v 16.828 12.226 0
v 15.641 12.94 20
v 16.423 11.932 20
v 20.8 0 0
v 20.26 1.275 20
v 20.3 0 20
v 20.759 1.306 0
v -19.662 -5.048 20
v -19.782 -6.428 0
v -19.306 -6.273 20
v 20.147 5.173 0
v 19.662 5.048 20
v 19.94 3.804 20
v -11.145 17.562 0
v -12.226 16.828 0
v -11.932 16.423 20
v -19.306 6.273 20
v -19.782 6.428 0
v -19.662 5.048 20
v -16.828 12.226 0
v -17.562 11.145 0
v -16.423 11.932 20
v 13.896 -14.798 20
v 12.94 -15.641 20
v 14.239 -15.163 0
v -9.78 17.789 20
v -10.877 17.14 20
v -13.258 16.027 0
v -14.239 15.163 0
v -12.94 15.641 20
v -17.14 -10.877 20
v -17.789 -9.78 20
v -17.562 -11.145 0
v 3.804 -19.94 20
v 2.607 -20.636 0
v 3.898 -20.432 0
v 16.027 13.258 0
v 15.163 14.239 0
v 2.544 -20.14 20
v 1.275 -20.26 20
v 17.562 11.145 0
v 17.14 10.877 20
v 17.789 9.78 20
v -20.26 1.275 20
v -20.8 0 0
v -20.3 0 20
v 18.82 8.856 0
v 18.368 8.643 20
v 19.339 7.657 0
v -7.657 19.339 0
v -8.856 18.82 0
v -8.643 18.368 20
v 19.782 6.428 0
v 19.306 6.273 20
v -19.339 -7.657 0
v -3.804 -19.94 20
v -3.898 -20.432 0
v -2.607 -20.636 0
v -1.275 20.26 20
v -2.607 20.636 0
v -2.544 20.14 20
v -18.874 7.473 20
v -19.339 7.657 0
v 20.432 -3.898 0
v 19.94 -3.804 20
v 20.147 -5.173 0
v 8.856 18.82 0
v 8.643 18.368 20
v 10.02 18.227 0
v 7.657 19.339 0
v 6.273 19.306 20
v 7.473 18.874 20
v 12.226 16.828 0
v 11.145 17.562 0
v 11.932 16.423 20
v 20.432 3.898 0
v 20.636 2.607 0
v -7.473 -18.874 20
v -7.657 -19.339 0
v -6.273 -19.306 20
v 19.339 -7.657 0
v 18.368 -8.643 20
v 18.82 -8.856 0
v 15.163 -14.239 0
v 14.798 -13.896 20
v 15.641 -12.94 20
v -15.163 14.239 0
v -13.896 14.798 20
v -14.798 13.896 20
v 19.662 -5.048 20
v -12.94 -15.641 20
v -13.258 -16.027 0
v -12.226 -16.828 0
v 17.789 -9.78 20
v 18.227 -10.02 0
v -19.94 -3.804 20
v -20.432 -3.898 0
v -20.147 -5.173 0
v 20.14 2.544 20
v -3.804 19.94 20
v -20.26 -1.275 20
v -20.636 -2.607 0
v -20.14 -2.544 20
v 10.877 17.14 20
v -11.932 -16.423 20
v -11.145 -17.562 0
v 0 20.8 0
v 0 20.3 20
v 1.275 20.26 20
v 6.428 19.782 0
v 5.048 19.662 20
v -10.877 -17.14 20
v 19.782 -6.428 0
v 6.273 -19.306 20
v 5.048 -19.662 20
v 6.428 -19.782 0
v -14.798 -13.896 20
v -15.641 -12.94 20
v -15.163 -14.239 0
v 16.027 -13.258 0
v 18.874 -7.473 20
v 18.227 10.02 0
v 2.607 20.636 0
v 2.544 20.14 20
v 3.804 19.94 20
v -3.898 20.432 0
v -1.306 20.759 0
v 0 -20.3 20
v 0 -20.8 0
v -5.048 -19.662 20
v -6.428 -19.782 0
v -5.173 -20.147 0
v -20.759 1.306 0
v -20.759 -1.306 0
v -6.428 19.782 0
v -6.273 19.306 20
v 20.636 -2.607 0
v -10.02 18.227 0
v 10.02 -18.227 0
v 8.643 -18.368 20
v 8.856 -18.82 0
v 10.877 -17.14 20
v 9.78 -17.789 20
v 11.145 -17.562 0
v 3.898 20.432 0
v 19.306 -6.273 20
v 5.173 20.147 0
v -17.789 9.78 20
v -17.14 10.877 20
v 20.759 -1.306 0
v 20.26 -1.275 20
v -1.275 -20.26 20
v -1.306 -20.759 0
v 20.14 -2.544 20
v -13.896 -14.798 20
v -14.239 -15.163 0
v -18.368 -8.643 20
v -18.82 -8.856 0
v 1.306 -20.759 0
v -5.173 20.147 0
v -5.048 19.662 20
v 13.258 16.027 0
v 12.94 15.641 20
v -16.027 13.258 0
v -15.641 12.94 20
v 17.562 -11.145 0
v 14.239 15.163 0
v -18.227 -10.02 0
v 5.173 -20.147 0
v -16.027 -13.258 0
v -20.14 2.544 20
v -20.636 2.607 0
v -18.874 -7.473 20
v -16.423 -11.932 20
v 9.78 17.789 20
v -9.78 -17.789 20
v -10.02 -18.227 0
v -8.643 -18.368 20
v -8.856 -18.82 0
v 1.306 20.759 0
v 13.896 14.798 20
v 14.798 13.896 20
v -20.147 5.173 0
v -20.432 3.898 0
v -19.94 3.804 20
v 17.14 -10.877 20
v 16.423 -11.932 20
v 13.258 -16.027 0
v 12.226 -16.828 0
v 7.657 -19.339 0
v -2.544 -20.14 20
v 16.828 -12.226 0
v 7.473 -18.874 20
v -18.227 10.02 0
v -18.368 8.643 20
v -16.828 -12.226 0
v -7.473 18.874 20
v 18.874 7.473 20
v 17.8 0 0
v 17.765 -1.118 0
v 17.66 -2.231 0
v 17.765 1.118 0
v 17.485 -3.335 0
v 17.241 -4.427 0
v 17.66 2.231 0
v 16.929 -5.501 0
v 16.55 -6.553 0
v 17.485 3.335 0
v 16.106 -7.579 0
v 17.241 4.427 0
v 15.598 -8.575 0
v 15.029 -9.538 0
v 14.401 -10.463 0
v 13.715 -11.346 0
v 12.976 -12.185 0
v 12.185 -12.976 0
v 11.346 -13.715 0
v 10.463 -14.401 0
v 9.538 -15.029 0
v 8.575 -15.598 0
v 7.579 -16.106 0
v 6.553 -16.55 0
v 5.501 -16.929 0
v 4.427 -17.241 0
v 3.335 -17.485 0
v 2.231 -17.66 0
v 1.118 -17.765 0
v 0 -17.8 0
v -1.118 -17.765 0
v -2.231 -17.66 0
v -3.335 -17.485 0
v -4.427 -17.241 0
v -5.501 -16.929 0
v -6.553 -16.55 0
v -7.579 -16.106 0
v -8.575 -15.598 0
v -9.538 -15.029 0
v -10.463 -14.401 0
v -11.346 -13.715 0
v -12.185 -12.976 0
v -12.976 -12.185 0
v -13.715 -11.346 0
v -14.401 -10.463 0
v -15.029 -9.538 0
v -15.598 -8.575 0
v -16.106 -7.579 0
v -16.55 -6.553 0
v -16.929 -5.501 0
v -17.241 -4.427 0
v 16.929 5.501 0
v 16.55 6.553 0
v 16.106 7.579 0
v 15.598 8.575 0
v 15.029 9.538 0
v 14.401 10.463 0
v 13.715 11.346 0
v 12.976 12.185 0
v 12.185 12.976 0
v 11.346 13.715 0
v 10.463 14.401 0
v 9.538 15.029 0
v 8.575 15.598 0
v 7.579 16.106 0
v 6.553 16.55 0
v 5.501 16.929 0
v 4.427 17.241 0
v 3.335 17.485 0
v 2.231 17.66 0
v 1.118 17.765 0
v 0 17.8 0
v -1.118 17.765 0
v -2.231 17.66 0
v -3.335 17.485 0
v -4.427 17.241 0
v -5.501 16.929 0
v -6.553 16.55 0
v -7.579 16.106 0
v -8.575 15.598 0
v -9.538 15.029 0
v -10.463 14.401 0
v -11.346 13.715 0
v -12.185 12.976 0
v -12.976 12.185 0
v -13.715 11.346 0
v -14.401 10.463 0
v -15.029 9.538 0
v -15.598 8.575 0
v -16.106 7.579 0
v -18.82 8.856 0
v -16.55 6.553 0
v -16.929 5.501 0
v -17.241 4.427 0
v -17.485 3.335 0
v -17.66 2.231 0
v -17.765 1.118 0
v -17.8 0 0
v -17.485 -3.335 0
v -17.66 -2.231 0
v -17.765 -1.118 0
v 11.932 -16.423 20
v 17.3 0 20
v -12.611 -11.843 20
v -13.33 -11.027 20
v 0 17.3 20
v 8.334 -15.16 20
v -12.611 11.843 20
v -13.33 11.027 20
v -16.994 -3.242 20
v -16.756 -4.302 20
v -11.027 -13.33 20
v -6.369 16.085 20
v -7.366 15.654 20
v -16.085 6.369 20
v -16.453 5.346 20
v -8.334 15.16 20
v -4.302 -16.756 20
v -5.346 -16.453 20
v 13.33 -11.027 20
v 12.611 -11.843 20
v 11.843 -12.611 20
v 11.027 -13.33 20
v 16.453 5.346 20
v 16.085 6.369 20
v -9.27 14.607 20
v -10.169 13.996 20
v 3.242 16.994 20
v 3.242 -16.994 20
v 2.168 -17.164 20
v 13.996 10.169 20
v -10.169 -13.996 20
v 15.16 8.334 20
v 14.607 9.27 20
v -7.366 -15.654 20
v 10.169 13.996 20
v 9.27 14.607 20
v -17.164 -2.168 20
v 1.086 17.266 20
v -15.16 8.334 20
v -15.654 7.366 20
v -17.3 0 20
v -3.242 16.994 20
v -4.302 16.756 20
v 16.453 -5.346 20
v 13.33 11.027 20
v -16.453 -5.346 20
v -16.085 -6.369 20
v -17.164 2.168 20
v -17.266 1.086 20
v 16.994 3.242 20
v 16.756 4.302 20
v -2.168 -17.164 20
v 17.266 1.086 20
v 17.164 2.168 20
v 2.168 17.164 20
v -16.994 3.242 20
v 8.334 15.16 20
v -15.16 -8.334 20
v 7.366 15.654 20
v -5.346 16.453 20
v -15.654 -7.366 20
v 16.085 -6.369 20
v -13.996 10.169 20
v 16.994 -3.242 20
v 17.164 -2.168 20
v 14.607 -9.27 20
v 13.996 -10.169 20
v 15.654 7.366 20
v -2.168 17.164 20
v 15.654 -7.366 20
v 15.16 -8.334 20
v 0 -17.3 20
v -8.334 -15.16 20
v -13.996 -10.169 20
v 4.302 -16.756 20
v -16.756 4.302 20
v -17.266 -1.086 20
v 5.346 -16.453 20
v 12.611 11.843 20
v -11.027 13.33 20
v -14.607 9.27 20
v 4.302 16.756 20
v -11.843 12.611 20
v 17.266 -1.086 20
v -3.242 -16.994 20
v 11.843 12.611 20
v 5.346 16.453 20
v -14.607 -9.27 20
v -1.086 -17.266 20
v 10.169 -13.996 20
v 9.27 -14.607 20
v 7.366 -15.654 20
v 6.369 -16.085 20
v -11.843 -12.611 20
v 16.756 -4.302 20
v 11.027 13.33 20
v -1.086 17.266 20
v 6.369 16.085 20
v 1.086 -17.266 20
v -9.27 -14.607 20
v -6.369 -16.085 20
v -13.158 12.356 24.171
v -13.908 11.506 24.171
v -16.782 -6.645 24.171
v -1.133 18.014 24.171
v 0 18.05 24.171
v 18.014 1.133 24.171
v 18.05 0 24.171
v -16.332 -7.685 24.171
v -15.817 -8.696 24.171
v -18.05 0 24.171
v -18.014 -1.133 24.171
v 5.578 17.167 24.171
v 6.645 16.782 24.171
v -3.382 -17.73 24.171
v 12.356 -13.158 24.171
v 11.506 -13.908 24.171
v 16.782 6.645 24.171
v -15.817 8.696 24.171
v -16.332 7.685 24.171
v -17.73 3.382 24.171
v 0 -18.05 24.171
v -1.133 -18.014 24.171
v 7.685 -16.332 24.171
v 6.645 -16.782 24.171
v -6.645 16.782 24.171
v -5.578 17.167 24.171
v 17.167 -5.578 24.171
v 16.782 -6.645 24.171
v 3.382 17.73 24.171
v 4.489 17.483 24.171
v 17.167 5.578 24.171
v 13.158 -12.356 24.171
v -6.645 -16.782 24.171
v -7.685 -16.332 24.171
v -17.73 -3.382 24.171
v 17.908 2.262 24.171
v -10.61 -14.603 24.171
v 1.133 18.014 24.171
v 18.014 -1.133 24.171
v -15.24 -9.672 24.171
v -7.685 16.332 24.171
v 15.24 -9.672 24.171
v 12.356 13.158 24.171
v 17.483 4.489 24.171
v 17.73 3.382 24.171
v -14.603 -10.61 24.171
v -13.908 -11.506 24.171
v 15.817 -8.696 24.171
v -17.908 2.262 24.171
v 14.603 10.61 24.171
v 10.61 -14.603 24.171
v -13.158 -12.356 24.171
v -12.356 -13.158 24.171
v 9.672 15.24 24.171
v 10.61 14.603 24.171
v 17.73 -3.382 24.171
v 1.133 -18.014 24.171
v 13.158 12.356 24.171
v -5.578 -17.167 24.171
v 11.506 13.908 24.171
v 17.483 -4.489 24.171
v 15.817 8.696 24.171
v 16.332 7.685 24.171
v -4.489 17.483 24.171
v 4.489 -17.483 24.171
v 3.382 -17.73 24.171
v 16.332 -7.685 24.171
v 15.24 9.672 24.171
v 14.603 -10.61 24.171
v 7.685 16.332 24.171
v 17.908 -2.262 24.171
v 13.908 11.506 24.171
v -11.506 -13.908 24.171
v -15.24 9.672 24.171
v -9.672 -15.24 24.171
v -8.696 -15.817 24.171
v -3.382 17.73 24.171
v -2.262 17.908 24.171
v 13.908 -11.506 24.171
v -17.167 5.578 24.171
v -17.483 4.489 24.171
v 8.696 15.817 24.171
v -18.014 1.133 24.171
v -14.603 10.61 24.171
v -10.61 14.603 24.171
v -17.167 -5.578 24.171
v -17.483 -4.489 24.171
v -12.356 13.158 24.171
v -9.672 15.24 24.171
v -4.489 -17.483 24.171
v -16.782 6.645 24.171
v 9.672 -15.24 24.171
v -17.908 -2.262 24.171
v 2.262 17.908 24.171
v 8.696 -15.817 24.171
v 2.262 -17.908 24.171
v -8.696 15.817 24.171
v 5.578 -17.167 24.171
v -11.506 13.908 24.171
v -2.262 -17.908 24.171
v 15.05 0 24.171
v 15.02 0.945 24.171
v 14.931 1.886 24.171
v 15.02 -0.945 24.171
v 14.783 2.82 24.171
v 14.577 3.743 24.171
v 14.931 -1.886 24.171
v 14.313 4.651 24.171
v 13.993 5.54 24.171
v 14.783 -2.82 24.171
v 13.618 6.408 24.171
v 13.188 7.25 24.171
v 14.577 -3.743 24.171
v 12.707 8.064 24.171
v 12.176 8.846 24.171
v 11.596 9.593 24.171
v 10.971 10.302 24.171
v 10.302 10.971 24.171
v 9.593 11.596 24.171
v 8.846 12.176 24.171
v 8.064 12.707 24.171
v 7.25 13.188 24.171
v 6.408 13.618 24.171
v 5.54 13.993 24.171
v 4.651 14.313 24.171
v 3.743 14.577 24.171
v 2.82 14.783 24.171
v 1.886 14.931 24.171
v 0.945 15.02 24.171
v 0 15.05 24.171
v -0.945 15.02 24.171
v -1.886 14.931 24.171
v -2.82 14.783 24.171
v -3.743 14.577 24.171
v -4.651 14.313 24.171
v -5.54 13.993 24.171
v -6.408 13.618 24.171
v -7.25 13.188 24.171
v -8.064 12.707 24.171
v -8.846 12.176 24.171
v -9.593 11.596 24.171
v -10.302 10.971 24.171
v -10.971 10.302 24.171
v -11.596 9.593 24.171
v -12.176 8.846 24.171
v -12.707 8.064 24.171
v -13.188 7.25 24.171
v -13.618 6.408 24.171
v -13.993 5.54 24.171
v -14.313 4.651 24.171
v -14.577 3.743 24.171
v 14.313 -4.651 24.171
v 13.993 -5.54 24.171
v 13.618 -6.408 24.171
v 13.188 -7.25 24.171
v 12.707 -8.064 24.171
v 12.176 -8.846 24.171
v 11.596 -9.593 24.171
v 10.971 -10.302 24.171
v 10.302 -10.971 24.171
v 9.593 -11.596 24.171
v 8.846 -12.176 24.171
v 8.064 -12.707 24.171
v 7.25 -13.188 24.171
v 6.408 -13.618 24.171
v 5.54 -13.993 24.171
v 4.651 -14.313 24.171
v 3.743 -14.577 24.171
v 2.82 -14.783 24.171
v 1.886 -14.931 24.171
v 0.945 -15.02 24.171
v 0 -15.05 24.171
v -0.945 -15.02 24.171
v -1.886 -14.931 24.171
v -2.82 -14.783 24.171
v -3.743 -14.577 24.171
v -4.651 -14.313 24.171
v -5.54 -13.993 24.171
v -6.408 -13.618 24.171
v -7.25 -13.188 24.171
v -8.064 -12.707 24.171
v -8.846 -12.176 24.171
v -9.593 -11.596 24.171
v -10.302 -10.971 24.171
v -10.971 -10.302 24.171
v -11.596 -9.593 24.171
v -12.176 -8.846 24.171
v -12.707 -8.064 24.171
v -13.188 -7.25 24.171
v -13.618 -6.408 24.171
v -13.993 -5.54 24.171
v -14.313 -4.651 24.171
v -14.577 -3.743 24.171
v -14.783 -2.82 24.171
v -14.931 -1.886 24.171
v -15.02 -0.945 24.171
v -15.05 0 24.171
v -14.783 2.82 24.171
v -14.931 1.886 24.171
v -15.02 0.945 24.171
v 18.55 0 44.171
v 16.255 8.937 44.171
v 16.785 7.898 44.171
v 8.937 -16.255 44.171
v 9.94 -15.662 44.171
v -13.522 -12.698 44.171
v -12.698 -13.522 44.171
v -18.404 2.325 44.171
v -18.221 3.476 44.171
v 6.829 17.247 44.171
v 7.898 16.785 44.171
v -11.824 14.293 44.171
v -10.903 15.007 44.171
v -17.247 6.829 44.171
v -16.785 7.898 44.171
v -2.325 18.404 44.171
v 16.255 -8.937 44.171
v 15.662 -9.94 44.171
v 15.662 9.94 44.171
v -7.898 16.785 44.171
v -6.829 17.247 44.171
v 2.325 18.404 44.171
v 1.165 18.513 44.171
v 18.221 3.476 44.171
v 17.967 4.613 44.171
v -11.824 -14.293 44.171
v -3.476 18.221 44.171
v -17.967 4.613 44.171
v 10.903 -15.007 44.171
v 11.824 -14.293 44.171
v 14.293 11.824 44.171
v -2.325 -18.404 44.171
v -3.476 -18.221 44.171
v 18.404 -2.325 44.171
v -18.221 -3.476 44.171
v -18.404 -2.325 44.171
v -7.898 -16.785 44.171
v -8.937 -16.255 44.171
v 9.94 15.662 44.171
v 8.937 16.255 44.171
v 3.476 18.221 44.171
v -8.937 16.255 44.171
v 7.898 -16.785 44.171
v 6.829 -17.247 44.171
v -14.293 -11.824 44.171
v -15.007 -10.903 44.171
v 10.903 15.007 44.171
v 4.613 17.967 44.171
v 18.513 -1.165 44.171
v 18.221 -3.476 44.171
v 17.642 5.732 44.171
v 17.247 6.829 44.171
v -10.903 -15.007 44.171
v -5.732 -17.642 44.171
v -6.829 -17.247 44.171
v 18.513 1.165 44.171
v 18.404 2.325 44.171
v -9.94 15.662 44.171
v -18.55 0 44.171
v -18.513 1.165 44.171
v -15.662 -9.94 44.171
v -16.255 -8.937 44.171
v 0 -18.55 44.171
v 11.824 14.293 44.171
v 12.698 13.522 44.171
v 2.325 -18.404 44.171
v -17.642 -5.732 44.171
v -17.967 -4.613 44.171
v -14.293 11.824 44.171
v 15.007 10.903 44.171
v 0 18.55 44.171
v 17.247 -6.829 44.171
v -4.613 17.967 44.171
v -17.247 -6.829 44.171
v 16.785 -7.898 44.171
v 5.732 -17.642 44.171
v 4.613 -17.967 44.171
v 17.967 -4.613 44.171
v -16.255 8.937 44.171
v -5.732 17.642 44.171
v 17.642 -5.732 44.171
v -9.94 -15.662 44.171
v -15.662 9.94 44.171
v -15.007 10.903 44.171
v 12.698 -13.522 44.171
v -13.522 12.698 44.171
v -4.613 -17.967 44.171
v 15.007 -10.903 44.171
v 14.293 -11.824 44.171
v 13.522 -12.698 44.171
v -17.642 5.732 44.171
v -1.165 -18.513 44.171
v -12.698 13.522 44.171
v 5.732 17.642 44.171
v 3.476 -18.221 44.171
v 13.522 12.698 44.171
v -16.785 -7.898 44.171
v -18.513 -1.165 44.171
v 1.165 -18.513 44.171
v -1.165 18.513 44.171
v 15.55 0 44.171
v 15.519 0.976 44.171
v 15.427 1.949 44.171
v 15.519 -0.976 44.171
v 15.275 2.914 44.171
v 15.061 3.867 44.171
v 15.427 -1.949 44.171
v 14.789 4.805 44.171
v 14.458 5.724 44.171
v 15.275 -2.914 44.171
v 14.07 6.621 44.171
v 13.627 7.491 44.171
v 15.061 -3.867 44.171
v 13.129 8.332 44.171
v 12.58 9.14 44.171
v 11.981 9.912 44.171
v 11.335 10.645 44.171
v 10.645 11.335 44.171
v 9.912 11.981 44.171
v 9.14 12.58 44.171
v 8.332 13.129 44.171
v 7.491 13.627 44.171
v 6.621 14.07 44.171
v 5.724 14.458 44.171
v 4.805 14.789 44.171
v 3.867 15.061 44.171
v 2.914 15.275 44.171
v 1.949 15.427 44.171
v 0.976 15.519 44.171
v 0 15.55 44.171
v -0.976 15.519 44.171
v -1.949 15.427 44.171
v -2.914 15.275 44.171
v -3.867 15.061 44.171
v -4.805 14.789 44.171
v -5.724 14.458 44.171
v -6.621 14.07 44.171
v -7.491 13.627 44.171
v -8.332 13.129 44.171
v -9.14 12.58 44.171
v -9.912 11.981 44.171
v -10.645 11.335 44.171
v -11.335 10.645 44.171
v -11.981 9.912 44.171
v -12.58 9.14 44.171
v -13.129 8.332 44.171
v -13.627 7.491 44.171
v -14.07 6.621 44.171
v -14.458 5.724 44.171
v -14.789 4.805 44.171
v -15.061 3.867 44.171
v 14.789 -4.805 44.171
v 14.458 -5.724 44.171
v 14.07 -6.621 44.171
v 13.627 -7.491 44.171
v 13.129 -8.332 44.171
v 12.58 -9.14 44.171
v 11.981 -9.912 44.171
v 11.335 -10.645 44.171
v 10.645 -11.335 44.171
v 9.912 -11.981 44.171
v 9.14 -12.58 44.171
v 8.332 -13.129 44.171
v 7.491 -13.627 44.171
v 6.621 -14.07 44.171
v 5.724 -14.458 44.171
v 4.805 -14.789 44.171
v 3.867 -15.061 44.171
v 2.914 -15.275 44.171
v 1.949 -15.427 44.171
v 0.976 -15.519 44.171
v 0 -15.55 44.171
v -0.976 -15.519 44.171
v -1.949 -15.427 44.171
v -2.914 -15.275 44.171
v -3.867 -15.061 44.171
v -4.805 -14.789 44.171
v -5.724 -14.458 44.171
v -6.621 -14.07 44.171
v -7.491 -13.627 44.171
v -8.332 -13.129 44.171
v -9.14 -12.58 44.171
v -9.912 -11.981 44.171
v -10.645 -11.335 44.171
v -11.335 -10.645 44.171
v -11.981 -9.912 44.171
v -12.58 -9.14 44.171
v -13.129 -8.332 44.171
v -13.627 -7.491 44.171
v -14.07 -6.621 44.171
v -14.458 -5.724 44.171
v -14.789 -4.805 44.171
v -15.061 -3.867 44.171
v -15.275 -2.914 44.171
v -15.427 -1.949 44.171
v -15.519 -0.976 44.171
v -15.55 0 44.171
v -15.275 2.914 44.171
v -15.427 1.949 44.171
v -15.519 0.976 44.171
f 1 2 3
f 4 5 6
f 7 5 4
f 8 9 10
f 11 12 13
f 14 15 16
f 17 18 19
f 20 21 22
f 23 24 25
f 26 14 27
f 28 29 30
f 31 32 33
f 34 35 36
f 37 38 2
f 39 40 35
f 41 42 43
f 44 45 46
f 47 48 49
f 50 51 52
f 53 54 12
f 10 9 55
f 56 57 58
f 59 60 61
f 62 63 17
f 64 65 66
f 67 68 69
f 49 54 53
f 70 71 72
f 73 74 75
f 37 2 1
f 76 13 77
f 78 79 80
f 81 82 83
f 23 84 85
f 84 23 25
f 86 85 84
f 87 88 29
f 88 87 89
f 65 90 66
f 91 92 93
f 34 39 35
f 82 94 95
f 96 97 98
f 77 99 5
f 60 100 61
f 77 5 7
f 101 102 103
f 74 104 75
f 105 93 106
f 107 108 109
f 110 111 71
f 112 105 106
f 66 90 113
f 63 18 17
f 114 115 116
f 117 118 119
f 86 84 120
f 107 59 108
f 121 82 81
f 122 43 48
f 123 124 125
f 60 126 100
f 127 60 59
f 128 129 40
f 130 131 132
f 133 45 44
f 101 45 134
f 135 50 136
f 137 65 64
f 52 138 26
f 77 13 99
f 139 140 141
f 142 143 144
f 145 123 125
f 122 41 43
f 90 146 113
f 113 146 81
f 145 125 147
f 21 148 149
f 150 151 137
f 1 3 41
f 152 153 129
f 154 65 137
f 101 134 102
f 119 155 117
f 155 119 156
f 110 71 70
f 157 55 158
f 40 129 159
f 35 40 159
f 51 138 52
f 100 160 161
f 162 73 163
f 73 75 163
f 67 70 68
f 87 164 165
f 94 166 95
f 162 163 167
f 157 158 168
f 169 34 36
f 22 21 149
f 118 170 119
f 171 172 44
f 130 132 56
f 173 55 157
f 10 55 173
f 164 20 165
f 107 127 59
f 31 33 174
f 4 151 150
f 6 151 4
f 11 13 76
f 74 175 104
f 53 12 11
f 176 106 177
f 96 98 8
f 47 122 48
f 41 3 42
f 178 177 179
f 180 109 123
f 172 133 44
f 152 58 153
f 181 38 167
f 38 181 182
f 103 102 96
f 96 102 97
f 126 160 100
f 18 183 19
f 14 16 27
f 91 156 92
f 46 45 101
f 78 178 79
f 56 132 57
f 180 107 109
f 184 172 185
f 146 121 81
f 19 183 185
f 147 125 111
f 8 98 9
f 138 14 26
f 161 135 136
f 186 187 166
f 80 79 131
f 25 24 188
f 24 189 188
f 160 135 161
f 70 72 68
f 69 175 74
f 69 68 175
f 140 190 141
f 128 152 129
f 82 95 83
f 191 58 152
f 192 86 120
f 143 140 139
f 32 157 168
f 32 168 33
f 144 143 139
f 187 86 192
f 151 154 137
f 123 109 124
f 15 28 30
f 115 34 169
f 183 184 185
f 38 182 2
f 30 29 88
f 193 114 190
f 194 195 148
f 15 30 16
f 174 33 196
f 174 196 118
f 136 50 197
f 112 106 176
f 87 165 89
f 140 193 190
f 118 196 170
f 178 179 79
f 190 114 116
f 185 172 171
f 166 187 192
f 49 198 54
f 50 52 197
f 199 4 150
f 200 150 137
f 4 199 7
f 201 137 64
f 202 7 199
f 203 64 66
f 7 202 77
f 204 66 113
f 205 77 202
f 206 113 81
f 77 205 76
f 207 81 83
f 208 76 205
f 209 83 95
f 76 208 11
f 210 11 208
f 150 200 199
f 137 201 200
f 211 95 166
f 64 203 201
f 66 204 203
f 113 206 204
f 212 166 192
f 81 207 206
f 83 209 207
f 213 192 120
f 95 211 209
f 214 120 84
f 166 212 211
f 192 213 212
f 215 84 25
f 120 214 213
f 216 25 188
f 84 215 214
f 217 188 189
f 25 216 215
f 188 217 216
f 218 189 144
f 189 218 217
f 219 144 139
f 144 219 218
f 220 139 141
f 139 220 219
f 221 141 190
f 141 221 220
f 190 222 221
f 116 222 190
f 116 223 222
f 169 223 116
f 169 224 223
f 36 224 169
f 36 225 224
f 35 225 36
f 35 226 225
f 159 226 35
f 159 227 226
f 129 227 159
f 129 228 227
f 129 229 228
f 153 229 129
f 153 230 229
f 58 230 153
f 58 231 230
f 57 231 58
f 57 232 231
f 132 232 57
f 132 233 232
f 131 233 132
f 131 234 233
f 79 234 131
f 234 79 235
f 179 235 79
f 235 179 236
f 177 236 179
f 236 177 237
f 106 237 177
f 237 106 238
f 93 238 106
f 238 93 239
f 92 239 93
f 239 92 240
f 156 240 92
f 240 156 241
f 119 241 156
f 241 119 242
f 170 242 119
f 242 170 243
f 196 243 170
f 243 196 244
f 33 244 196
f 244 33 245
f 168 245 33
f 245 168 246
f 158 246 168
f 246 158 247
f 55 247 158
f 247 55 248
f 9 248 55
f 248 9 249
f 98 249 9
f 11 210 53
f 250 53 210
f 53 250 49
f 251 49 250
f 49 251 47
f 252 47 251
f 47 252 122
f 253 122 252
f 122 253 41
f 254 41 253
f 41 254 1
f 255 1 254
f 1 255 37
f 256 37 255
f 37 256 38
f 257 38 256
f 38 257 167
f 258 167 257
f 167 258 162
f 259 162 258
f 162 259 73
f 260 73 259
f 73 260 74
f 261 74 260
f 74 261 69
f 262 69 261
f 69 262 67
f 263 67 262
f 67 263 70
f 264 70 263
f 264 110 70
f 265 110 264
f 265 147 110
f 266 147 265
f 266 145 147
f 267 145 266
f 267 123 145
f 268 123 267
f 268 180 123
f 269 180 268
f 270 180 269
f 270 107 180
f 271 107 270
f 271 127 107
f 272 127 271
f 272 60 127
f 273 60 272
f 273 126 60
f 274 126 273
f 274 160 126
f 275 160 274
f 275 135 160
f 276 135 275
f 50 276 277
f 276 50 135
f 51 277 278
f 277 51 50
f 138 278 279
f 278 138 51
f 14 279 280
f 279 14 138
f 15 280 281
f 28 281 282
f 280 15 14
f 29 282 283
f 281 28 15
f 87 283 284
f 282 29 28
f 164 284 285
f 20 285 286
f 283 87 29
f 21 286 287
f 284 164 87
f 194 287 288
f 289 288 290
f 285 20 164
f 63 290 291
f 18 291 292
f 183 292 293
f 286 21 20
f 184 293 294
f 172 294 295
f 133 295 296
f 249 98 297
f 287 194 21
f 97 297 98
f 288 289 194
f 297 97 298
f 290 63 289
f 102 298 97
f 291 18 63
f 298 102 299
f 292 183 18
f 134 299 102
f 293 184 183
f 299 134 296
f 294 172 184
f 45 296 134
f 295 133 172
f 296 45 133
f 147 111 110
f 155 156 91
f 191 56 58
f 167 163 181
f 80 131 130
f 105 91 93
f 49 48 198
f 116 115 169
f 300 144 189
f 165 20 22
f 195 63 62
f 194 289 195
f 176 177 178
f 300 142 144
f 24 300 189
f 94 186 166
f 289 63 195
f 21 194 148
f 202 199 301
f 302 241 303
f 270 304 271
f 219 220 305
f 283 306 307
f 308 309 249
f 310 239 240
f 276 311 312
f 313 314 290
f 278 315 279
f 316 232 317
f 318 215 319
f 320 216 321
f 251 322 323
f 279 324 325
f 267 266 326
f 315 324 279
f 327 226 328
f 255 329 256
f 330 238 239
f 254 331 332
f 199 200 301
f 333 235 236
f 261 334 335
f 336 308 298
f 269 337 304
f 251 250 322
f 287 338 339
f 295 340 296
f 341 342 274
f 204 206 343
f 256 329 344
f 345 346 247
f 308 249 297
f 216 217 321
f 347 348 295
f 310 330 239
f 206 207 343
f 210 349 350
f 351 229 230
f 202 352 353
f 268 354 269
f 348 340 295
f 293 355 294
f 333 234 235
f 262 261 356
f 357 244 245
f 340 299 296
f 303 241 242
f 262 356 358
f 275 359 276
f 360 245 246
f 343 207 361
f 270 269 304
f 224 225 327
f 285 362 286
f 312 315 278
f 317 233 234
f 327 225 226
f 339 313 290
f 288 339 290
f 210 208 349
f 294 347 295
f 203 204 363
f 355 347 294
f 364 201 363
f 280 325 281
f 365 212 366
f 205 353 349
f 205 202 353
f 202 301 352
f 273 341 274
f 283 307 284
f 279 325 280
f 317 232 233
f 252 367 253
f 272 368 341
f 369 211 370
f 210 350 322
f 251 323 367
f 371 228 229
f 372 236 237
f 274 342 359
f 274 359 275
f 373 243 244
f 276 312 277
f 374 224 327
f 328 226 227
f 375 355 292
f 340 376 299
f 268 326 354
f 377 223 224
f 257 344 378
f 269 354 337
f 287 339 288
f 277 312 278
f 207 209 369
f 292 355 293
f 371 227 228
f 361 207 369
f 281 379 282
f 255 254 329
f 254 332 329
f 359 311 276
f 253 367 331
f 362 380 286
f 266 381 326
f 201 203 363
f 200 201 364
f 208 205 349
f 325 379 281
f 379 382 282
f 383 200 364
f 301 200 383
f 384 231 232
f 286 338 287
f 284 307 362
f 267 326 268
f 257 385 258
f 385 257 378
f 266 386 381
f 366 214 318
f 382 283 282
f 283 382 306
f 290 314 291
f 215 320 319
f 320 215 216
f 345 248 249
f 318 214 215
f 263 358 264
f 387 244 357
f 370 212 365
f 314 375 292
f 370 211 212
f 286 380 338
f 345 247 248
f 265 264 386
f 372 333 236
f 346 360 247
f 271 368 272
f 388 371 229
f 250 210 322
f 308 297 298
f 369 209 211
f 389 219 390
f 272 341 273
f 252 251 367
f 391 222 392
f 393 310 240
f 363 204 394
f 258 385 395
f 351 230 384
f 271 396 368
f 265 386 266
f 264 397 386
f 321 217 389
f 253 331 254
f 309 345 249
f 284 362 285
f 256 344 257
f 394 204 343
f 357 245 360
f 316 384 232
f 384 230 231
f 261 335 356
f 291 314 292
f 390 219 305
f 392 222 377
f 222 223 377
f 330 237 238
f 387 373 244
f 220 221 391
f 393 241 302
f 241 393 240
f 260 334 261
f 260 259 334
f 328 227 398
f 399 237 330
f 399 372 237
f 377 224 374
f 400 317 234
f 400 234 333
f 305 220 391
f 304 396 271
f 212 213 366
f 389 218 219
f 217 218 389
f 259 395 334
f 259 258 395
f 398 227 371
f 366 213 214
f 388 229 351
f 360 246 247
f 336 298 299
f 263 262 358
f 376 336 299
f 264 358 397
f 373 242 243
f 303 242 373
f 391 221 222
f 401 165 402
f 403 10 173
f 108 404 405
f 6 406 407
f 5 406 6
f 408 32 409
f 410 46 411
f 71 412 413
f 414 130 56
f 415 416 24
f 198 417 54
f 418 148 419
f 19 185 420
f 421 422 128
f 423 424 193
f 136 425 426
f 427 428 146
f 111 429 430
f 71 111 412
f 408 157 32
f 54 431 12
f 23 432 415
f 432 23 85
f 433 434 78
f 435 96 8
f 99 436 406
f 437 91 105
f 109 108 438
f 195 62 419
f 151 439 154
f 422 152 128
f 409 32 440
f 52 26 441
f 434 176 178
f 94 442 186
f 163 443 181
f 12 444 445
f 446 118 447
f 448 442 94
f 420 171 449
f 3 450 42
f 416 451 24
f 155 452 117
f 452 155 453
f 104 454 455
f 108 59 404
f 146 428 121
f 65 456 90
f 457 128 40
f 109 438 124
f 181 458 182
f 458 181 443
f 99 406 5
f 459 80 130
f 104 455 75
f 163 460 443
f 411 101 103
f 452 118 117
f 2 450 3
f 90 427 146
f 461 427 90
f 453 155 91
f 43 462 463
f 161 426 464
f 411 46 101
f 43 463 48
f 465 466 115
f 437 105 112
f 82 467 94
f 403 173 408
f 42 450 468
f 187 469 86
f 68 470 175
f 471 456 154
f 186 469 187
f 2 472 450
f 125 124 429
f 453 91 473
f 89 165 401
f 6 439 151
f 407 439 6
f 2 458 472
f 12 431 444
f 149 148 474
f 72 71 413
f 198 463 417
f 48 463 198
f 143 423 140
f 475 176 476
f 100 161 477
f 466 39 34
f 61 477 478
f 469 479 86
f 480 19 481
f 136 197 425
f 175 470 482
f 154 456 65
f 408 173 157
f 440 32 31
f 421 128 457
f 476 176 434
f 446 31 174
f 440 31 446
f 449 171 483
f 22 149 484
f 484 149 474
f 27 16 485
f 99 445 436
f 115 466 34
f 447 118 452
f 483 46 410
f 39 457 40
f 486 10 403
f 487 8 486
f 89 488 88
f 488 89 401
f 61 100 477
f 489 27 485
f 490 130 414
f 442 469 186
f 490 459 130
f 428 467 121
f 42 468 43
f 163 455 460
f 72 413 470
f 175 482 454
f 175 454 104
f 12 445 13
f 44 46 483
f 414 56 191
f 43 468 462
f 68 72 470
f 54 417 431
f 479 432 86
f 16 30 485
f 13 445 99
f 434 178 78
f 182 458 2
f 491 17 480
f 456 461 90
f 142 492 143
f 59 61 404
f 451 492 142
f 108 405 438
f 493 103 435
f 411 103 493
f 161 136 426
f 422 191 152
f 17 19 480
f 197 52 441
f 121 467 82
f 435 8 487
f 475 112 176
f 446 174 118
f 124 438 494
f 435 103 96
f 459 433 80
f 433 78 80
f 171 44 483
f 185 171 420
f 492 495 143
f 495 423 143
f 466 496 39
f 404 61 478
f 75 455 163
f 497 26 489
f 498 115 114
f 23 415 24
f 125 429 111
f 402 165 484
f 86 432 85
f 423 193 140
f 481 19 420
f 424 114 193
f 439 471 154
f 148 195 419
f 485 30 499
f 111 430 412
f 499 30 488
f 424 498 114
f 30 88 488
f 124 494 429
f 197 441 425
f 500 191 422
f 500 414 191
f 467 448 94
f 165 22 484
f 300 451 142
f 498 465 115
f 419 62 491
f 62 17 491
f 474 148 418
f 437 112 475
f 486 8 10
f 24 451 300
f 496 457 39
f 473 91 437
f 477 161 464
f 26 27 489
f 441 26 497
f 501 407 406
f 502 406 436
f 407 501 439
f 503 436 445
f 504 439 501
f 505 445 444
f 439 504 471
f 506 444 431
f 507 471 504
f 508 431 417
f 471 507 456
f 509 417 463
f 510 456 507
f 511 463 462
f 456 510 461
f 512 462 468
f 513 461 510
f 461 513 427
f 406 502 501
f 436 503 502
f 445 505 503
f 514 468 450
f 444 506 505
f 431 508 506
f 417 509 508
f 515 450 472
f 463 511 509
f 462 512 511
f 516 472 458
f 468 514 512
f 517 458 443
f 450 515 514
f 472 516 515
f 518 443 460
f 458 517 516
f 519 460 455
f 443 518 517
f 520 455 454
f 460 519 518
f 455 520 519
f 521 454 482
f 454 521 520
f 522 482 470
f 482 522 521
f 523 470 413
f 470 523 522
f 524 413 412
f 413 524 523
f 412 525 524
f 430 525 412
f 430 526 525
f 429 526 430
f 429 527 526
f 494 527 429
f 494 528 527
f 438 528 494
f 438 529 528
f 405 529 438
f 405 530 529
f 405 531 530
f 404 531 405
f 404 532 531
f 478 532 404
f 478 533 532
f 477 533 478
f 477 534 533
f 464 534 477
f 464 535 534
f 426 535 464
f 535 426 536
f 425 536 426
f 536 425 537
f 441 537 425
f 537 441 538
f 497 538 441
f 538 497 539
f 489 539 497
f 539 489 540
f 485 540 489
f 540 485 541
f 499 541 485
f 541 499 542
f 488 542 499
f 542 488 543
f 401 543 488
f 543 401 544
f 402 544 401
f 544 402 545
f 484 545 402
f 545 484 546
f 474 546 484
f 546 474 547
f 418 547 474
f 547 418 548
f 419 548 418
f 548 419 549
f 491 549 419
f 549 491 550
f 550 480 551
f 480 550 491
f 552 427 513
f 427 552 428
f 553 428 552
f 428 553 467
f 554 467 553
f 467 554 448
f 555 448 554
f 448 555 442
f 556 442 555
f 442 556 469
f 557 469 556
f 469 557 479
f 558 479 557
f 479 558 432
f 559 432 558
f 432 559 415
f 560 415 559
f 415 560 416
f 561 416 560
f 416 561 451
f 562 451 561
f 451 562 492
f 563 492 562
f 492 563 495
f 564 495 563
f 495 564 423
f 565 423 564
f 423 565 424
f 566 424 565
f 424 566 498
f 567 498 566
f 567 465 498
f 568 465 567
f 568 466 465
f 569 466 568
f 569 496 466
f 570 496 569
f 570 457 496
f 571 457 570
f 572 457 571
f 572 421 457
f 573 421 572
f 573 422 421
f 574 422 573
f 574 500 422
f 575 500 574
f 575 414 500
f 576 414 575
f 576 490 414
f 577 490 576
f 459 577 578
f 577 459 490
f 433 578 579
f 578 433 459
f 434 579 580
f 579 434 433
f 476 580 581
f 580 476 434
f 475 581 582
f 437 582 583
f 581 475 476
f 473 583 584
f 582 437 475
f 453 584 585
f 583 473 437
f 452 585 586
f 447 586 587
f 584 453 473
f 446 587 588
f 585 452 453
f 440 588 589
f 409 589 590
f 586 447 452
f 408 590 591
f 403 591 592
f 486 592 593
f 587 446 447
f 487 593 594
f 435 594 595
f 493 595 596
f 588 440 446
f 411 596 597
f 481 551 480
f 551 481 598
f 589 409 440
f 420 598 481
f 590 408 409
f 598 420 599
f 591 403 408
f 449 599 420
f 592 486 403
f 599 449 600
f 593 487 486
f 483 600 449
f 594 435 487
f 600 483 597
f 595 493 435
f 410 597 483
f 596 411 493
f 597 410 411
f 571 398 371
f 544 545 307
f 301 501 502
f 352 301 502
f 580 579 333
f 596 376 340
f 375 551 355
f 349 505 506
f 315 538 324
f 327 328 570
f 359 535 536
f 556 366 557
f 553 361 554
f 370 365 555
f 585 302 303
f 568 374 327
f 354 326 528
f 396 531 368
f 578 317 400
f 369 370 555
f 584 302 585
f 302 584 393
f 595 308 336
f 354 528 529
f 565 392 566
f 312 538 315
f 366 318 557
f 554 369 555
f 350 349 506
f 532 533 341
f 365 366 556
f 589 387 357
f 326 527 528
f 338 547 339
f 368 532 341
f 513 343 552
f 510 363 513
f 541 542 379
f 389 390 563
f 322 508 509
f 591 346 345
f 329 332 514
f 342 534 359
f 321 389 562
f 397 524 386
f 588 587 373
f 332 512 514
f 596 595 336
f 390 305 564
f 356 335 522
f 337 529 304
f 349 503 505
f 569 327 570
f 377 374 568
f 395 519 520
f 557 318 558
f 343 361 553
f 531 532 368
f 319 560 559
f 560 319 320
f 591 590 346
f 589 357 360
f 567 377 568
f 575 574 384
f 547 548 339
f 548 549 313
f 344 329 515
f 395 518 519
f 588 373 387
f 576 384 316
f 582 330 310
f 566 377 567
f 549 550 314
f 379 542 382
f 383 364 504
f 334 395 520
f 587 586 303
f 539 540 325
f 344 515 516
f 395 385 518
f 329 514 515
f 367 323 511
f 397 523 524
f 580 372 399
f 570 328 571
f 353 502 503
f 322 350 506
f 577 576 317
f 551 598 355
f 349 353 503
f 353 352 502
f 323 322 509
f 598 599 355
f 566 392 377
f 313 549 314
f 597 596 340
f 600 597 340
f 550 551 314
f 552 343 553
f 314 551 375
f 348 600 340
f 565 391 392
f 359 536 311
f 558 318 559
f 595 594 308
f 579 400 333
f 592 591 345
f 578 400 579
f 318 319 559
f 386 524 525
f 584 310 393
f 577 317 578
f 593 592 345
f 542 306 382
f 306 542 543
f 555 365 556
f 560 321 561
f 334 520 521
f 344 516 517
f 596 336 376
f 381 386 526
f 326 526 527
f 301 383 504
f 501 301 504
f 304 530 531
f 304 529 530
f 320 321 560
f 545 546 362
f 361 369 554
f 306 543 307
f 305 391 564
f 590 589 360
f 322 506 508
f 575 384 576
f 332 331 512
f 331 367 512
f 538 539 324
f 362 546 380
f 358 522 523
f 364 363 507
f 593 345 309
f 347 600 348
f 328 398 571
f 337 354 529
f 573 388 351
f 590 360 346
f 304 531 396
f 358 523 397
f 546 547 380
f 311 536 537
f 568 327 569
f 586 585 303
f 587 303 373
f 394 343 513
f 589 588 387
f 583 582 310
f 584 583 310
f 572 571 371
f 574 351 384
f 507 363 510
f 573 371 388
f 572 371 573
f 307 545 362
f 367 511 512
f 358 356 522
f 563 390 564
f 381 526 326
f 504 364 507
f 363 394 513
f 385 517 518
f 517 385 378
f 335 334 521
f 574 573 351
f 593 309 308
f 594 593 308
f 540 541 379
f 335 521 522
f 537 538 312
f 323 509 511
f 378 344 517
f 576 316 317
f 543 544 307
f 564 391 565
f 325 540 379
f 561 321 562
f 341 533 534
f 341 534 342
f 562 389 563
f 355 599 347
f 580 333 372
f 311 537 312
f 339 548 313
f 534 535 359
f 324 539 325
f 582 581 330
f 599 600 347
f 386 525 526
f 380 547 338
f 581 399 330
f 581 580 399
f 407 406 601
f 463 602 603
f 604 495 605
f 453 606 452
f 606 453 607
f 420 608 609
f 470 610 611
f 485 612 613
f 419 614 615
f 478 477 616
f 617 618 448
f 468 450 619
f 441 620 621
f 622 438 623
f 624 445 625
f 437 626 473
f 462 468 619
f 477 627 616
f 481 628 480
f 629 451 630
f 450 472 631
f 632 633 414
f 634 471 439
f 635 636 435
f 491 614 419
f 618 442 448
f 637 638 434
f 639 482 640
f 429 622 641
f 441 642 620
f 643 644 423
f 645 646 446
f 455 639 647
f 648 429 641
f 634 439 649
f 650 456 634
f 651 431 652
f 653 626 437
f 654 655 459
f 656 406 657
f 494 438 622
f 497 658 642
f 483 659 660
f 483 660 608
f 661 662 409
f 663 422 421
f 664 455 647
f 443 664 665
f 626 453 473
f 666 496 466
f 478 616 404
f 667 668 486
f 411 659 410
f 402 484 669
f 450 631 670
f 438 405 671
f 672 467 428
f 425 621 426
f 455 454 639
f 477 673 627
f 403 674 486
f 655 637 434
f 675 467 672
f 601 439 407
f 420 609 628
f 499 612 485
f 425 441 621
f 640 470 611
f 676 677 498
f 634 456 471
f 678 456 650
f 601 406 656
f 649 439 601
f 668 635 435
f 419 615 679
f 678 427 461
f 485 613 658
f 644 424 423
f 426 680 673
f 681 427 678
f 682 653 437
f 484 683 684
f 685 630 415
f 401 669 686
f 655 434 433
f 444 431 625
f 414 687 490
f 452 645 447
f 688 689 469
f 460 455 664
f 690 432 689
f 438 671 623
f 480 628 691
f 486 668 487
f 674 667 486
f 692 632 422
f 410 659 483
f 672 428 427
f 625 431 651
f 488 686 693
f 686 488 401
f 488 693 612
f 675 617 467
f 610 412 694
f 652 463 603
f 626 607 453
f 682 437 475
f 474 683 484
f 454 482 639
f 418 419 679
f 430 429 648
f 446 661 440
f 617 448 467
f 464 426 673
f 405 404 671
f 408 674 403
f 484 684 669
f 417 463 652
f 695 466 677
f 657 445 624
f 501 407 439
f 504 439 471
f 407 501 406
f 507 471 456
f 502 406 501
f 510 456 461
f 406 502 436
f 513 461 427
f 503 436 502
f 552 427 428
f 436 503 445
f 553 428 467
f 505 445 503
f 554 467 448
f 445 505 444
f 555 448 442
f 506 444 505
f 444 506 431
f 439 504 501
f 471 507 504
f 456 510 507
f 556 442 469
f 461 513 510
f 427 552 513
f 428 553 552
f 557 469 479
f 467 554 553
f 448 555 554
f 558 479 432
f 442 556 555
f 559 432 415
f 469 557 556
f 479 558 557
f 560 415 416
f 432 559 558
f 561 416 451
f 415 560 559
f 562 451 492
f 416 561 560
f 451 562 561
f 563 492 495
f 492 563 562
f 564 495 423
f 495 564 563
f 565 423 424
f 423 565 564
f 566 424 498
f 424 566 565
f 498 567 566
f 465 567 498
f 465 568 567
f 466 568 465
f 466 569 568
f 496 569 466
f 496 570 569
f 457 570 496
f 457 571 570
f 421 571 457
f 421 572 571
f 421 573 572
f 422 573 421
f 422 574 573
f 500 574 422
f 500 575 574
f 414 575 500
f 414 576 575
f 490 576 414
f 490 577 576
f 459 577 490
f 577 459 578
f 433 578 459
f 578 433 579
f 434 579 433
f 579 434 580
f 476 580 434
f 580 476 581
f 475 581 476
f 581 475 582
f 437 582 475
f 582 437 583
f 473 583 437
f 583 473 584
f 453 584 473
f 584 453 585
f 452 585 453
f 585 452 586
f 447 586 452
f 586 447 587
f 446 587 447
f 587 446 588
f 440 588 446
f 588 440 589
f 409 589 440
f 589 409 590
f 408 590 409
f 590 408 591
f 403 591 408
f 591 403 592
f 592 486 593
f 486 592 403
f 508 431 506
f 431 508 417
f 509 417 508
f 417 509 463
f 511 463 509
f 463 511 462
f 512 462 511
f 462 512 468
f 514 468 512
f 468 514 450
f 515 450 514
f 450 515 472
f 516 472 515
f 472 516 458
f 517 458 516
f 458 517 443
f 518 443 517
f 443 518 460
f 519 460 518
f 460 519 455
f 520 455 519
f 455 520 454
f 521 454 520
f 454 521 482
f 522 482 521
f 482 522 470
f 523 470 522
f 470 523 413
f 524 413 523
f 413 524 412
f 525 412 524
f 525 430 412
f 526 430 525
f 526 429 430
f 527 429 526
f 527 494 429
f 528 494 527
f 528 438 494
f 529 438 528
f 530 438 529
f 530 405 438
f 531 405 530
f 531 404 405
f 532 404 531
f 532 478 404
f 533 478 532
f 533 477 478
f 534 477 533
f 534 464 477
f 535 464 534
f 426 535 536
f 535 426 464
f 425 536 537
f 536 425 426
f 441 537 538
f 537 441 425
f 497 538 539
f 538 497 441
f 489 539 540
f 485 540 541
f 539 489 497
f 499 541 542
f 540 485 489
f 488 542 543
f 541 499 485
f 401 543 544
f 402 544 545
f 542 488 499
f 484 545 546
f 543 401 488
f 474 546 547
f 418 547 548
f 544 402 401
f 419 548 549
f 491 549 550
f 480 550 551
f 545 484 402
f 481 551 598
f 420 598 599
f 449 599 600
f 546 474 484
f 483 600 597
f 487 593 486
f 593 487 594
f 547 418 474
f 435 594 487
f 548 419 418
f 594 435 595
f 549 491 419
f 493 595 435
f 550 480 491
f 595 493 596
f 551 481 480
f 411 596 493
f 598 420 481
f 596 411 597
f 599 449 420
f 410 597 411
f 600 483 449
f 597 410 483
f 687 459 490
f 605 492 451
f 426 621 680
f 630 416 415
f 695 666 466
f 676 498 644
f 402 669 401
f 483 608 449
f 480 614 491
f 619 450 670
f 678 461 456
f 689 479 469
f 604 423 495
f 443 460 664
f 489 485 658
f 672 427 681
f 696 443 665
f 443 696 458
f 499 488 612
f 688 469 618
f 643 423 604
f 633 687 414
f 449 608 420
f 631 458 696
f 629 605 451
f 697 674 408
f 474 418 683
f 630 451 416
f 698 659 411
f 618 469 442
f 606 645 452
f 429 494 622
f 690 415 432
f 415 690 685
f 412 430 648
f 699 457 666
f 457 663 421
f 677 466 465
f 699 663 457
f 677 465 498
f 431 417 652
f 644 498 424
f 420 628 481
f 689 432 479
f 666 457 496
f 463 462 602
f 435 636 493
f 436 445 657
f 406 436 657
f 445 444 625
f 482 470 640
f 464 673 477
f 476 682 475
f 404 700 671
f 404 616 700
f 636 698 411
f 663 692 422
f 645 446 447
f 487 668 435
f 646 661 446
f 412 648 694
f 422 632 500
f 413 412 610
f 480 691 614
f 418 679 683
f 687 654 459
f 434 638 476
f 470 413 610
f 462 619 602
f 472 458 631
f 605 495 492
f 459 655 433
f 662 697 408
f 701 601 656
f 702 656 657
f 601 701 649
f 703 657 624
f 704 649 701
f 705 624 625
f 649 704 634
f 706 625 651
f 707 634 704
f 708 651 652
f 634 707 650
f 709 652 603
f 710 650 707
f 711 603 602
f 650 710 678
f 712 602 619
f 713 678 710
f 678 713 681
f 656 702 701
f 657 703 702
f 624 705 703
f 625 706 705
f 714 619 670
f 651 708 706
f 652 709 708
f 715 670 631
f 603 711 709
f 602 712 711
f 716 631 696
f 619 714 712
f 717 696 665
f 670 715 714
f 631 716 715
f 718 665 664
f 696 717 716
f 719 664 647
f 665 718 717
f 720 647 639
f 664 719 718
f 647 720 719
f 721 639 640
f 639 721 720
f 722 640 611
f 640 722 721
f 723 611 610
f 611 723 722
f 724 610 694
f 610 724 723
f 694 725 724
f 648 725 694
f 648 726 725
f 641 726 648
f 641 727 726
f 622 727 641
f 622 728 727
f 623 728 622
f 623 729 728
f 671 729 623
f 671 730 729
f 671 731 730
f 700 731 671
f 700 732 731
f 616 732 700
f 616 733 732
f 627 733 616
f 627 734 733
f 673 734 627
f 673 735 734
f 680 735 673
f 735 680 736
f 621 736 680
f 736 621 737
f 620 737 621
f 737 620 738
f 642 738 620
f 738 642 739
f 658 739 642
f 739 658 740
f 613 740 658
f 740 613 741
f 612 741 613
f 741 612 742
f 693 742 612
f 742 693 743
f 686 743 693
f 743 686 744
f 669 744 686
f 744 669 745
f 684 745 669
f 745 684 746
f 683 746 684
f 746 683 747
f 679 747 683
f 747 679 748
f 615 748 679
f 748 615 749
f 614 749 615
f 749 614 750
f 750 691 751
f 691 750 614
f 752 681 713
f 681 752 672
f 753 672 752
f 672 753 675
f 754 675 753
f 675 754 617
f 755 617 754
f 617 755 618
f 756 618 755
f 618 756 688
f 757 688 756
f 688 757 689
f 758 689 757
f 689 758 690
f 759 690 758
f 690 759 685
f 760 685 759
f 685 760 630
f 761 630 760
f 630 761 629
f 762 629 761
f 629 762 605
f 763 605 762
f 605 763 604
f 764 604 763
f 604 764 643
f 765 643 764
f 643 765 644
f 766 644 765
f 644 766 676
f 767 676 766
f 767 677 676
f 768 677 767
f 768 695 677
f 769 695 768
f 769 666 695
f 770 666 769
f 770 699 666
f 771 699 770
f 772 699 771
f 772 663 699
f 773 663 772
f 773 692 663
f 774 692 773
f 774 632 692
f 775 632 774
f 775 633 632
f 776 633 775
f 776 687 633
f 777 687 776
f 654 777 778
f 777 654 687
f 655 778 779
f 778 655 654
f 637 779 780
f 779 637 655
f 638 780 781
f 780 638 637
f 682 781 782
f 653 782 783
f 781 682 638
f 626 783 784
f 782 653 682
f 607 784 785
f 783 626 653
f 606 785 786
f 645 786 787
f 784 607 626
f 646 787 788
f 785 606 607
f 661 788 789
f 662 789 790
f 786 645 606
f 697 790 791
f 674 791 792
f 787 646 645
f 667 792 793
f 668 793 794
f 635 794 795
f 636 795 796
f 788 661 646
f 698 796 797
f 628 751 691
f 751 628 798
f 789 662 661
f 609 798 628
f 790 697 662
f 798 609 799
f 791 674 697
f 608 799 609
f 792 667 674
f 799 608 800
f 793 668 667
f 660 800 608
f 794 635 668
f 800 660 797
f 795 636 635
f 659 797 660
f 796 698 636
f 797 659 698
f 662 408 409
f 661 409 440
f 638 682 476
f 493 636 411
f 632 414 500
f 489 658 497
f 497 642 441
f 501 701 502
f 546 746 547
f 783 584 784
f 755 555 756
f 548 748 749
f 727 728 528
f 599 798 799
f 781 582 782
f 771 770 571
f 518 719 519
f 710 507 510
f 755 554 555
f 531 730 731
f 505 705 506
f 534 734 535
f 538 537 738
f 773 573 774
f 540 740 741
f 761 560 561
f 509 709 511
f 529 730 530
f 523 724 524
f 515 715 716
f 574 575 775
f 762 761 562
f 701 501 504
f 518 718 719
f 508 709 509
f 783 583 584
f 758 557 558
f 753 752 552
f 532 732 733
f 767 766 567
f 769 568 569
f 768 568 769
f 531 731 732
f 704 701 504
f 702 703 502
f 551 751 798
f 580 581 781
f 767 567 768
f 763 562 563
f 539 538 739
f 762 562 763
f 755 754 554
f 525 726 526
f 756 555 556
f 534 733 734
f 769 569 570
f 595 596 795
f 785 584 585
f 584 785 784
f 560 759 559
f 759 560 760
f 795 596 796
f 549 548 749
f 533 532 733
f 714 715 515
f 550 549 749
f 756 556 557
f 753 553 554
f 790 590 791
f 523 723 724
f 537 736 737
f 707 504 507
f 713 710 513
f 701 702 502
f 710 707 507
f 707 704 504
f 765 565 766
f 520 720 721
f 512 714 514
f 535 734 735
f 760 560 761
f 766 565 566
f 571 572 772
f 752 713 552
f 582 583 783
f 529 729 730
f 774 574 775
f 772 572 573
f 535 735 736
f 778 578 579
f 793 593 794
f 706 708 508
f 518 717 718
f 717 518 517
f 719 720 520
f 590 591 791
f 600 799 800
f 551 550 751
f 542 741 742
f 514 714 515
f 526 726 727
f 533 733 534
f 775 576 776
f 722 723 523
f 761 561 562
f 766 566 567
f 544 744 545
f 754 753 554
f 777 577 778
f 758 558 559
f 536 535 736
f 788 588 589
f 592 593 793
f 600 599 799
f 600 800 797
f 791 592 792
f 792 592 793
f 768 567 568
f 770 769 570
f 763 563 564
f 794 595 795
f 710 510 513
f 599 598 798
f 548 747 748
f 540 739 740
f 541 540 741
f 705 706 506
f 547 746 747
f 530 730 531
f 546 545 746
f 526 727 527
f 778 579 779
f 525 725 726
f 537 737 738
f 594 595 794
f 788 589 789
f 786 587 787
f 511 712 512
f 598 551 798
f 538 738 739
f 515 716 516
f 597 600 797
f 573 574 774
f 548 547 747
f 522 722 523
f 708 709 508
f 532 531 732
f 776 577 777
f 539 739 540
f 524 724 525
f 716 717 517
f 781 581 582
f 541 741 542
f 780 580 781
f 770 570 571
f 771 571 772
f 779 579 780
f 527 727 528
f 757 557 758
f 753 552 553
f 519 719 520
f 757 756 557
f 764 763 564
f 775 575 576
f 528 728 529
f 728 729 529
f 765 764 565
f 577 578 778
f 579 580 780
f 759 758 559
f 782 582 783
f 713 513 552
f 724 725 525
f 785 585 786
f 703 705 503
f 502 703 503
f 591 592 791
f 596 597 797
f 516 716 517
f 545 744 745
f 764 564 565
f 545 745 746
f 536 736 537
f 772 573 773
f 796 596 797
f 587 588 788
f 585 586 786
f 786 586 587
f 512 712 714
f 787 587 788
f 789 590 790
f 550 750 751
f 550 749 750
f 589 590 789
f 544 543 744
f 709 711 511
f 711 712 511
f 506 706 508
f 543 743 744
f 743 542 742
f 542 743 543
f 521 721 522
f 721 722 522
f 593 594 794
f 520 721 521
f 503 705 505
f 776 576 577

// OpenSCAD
/** Adapter for vacuum hoses
 * Licence: CC:BY-SA
 */

/* [Parameters] */

// Inner diameter of large cylinder (mm)
LargeInnerDiameter = 35.1;
// Length of large cylinder (mm)
LargeLength=20;
// Inner diameter of small cylinder (mm)
SmallInnerDiameter = 30.6;
// Length of small cylinder (mm)
SmallLength=20;
// Thickness of walls (mm)
Thickness = 3;

// Resolution
$fn = 100;

/* large cylinder */
difference() {
	cylinder (d1=LargeInnerDiameter+0.5+2*Thickness, d2=LargeInnerDiameter-0.5+2*Thickness, h=LargeLength);
	cylinder (d=LargeInnerDiameter+0.5,              d2=LargeInnerDiameter-0.5,             h=LargeLength);
}

/* link between large & small cylinder
 * length is computed for a 50° angle from horizontal
 * so it's printable without support
 */
overhang = LargeInnerDiameter-0.5 - (SmallInnerDiameter+0.5);
MiddleLength = (tan(50) * overhang) > 3 ? (tan(50) * overhang) : 3;
echo ("MiddleLength", MiddleLength, "overhang", overhang);

translate ([0, 0, LargeLength])
	difference() {
		cylinder (d1=LargeInnerDiameter-0.5+2*Thickness, d2=SmallInnerDiameter-0.5+2*Thickness, h=MiddleLength);
		cylinder (d1=LargeInnerDiameter-0.5,             d2=SmallInnerDiameter-0.5,             h=MiddleLength);
	}

/* small cylinder */
translate ([0, 0, LargeLength+MiddleLength])
	difference() {
		cylinder (d1=SmallInnerDiameter-0.5+2*Thickness, d2=SmallInnerDiameter+0.5+2*Thickness, h=SmallLength);
		cylinder (d=SmallInnerDiameter-0.5,              d2=SmallInnerDiameter+0.5,             h=SmallLength);
	}
